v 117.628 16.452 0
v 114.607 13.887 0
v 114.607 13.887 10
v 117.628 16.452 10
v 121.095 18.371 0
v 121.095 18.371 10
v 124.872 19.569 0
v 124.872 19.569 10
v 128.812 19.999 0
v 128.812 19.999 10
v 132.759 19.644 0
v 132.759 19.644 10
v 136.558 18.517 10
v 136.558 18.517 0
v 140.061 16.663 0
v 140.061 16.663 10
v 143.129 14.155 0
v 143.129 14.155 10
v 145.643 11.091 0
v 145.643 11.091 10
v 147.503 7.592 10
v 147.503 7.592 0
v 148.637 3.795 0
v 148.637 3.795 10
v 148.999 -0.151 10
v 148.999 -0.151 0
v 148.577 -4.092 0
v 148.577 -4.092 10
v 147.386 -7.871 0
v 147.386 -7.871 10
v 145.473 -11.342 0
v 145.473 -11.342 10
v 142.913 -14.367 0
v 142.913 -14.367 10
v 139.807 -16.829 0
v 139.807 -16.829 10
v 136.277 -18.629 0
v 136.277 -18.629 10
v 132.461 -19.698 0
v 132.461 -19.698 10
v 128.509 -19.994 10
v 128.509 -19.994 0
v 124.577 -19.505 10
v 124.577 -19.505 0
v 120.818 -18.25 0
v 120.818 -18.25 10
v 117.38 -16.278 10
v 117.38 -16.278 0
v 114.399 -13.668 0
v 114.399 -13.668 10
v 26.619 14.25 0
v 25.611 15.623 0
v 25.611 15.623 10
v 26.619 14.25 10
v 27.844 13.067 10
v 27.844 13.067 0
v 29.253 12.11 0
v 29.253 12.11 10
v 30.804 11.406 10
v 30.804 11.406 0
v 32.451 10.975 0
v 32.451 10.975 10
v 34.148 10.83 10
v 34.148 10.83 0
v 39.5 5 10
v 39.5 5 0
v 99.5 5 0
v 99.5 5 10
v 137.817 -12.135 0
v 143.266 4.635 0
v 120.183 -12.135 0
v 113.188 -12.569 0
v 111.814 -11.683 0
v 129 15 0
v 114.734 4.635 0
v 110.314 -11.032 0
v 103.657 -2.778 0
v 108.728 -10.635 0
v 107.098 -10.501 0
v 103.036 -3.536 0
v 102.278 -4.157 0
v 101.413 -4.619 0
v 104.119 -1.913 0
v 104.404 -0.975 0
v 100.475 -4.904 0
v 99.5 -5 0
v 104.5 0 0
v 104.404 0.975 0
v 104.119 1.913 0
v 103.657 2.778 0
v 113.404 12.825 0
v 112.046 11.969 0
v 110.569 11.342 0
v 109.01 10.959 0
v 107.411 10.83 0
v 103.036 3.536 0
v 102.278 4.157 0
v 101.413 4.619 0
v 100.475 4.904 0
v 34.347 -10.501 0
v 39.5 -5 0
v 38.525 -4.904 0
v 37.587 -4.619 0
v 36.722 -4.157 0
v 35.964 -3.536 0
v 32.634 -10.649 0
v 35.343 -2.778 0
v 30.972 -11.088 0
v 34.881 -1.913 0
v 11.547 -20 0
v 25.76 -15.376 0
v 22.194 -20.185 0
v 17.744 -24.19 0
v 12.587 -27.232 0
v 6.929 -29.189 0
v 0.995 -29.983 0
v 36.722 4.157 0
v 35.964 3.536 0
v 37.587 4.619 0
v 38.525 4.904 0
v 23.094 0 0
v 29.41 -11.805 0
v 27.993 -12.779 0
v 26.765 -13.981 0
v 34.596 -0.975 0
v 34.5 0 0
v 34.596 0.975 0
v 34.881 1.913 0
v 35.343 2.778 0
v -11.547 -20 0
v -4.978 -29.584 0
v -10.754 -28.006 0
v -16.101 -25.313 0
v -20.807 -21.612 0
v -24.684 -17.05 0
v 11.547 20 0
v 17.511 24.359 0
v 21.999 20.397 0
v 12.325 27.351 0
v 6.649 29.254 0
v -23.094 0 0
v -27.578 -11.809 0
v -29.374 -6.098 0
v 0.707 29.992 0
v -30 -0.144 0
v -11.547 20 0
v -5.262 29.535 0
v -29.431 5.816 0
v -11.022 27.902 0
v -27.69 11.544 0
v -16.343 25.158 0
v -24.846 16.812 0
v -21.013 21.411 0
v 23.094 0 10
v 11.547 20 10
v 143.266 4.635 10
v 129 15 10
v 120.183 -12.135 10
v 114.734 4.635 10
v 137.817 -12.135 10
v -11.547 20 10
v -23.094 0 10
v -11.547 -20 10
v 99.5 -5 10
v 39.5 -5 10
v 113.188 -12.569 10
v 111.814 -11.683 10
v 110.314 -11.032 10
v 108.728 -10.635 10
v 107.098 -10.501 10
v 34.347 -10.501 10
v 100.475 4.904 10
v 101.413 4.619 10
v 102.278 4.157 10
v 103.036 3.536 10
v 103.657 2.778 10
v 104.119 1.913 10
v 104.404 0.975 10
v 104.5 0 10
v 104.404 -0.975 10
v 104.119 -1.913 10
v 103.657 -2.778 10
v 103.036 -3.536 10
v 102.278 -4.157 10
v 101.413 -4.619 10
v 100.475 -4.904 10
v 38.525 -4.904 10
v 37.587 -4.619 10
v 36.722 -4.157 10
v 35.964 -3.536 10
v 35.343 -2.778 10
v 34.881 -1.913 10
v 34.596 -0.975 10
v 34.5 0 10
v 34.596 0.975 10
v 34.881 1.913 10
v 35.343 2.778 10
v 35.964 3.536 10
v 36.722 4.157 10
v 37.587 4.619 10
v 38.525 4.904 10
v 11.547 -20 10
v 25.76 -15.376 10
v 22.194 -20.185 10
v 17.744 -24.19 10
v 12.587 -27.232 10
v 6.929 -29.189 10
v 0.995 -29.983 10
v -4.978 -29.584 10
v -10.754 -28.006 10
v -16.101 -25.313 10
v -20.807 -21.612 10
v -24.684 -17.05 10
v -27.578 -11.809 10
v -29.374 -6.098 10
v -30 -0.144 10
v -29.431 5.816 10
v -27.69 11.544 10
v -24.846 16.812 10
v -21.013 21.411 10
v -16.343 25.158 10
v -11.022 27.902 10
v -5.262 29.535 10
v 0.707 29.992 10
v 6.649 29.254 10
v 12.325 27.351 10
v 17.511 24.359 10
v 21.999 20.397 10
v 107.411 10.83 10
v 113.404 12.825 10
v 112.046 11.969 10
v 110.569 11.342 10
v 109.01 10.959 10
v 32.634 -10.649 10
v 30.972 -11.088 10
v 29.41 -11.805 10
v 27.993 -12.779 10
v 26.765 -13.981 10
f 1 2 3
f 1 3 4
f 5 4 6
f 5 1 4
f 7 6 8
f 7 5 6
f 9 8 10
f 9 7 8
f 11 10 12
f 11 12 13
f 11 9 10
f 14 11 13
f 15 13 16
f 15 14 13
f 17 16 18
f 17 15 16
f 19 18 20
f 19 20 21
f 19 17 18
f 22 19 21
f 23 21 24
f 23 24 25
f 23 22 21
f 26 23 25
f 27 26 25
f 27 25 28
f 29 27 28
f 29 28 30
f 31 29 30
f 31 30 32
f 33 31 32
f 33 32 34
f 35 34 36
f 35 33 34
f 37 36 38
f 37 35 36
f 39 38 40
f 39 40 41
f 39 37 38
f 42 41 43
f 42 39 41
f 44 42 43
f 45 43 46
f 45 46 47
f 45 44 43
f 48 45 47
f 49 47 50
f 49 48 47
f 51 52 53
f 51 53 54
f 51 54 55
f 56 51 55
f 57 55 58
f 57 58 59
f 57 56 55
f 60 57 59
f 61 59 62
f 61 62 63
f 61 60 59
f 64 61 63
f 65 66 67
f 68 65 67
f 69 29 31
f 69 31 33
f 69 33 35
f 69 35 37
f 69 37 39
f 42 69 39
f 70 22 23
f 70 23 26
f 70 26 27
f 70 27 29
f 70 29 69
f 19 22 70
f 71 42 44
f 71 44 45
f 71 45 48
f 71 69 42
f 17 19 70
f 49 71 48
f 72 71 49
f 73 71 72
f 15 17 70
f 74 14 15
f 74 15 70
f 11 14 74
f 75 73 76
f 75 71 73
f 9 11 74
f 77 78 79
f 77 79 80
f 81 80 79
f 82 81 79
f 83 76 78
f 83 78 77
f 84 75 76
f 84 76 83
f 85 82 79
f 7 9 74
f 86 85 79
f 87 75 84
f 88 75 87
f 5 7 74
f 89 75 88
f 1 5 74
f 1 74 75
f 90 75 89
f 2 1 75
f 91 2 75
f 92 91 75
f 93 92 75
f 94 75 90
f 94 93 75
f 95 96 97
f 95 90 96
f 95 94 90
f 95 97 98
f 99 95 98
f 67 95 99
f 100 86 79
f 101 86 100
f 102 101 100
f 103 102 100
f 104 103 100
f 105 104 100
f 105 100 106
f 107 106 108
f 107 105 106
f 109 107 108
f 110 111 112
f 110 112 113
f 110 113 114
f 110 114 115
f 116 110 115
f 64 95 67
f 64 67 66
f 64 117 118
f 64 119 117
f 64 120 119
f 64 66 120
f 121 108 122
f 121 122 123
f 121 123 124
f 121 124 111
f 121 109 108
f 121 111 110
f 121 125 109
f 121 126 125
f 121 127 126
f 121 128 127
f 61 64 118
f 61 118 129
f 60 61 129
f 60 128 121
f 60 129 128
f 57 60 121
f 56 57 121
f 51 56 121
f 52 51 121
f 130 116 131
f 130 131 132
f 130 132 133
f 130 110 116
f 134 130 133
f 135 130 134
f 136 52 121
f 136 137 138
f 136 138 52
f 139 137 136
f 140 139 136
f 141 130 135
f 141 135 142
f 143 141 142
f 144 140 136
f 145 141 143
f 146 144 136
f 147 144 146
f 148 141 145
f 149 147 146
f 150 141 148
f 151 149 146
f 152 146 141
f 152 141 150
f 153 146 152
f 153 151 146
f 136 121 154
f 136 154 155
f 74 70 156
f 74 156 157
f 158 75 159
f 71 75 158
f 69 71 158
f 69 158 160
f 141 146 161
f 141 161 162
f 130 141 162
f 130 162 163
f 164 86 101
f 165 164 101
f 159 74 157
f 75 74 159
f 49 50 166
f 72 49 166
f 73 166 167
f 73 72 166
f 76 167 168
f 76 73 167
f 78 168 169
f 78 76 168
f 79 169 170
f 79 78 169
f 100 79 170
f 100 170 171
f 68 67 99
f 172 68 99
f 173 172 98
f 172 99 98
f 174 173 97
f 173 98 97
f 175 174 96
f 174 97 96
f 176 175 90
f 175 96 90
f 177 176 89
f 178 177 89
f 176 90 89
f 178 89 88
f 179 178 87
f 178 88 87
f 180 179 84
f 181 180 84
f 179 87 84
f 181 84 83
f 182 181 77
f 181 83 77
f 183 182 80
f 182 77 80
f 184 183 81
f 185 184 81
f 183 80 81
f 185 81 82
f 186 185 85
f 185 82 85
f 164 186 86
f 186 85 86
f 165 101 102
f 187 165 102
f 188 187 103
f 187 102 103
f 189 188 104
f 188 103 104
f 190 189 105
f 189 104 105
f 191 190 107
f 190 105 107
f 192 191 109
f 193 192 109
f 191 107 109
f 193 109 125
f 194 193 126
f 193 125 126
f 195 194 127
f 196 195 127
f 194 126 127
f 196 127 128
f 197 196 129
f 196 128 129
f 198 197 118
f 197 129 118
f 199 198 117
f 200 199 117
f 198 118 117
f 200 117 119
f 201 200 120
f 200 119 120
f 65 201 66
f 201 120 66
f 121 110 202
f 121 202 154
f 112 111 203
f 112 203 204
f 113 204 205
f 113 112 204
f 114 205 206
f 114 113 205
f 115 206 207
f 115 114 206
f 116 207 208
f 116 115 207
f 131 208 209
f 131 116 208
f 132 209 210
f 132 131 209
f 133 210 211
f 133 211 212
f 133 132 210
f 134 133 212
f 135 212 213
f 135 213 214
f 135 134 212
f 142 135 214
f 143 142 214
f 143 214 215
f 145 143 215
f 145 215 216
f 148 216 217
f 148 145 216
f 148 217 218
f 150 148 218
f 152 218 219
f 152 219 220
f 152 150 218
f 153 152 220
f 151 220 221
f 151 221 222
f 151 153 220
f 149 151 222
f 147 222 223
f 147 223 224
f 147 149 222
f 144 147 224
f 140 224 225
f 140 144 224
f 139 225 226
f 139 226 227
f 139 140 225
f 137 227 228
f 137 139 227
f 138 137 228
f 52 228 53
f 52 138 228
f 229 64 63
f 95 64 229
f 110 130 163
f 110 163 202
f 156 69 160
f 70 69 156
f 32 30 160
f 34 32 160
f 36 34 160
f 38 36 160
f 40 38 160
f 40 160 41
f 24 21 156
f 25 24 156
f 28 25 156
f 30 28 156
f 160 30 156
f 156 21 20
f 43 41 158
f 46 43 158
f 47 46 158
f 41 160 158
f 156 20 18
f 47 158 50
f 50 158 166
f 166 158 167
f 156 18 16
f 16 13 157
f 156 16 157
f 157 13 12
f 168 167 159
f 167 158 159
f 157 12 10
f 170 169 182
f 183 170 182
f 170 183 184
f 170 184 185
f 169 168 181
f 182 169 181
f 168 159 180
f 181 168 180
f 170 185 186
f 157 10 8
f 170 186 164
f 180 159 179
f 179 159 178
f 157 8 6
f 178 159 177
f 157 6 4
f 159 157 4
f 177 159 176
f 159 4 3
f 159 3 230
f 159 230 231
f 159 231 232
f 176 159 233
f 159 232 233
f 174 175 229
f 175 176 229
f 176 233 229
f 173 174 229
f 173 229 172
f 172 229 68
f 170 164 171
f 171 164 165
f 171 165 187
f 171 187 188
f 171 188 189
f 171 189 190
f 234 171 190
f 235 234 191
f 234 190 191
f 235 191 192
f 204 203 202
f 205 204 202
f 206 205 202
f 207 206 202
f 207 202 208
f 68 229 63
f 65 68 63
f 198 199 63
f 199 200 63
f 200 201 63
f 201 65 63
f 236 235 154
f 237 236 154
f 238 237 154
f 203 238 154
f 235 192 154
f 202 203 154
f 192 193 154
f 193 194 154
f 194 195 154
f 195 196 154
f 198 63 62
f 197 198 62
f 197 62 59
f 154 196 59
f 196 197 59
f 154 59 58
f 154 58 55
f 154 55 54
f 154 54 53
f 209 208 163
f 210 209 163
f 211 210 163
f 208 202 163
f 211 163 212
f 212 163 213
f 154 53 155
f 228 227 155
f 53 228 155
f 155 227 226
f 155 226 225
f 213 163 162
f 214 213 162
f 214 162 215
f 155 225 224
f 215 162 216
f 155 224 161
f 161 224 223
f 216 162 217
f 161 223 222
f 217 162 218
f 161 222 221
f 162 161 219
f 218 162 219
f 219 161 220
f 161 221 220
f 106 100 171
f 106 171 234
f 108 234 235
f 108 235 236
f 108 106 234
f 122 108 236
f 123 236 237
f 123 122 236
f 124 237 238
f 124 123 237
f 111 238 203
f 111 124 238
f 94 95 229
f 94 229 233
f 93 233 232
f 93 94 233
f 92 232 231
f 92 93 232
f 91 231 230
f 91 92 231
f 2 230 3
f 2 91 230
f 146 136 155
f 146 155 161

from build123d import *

# Parameters (mm, degrees)
BOSS_EXTRUDE1_DEPTH = 10


with BuildPart() as part:
    # Sketch1 → Boss-Extrude1 (new body)
    with BuildSketch(Plane.XY):
        with BuildLine():
            Line((34.148205858, 10.830267321), (107.410651623, 10.830267321))
            ThreePointArc((107.410651623, 10.830267321), (111.319985045, 11.626077395), (114.607101082, 13.886844881))
            ThreePointArc((114.607101082, 13.886844881), (148.999427872, -0.151277258), (114.398677604, -13.667530292))
            ThreePointArc((114.398677604, -13.667530292), (111.076857226, -11.326938473), (107.098016406, -10.501295438))
            Line((107.098016406, -10.501295438), (34.346715787, -10.501295438))
            ThreePointArc((34.346715787, -10.501295438), (29.409775368, -11.80493877), (25.76003684, -15.375971579))
            ThreePointArc((25.76003684, -15.375971579), (-29.999653993, -0.144084298), (25.611154394, 15.622700491))
            ThreePointArc((25.611154394, 15.622700491), (29.253089327, 12.110299767), (34.148205858, 10.830267321))
        make_face()
        Polygon((11.547005384, 20), (-11.547005384, 20), (-23.094010768, 0), (-11.547005384, -20), (11.547005384, -20), (23.094010768, 0), align=None, mode=Mode.SUBTRACT)
        Polygon((129, 15), (114.734152256, 4.635254916), (120.183221216, -12.135254916), (137.816778784, -12.135254916), (143.265847744, 4.635254916), align=None, mode=Mode.SUBTRACT)
        with BuildLine():
            Line((39.5, 5), (99.5, 5))
            ThreePointArc((99.5, 5), (104.5, 0), (99.5, -5))
            Line((99.5, -5), (39.5, -5))
            ThreePointArc((39.5, -5), (34.5, 0), (39.5, 5))
        make_face(mode=Mode.SUBTRACT)
    extrude(amount=BOSS_EXTRUDE1_DEPTH)


solid = part.part
